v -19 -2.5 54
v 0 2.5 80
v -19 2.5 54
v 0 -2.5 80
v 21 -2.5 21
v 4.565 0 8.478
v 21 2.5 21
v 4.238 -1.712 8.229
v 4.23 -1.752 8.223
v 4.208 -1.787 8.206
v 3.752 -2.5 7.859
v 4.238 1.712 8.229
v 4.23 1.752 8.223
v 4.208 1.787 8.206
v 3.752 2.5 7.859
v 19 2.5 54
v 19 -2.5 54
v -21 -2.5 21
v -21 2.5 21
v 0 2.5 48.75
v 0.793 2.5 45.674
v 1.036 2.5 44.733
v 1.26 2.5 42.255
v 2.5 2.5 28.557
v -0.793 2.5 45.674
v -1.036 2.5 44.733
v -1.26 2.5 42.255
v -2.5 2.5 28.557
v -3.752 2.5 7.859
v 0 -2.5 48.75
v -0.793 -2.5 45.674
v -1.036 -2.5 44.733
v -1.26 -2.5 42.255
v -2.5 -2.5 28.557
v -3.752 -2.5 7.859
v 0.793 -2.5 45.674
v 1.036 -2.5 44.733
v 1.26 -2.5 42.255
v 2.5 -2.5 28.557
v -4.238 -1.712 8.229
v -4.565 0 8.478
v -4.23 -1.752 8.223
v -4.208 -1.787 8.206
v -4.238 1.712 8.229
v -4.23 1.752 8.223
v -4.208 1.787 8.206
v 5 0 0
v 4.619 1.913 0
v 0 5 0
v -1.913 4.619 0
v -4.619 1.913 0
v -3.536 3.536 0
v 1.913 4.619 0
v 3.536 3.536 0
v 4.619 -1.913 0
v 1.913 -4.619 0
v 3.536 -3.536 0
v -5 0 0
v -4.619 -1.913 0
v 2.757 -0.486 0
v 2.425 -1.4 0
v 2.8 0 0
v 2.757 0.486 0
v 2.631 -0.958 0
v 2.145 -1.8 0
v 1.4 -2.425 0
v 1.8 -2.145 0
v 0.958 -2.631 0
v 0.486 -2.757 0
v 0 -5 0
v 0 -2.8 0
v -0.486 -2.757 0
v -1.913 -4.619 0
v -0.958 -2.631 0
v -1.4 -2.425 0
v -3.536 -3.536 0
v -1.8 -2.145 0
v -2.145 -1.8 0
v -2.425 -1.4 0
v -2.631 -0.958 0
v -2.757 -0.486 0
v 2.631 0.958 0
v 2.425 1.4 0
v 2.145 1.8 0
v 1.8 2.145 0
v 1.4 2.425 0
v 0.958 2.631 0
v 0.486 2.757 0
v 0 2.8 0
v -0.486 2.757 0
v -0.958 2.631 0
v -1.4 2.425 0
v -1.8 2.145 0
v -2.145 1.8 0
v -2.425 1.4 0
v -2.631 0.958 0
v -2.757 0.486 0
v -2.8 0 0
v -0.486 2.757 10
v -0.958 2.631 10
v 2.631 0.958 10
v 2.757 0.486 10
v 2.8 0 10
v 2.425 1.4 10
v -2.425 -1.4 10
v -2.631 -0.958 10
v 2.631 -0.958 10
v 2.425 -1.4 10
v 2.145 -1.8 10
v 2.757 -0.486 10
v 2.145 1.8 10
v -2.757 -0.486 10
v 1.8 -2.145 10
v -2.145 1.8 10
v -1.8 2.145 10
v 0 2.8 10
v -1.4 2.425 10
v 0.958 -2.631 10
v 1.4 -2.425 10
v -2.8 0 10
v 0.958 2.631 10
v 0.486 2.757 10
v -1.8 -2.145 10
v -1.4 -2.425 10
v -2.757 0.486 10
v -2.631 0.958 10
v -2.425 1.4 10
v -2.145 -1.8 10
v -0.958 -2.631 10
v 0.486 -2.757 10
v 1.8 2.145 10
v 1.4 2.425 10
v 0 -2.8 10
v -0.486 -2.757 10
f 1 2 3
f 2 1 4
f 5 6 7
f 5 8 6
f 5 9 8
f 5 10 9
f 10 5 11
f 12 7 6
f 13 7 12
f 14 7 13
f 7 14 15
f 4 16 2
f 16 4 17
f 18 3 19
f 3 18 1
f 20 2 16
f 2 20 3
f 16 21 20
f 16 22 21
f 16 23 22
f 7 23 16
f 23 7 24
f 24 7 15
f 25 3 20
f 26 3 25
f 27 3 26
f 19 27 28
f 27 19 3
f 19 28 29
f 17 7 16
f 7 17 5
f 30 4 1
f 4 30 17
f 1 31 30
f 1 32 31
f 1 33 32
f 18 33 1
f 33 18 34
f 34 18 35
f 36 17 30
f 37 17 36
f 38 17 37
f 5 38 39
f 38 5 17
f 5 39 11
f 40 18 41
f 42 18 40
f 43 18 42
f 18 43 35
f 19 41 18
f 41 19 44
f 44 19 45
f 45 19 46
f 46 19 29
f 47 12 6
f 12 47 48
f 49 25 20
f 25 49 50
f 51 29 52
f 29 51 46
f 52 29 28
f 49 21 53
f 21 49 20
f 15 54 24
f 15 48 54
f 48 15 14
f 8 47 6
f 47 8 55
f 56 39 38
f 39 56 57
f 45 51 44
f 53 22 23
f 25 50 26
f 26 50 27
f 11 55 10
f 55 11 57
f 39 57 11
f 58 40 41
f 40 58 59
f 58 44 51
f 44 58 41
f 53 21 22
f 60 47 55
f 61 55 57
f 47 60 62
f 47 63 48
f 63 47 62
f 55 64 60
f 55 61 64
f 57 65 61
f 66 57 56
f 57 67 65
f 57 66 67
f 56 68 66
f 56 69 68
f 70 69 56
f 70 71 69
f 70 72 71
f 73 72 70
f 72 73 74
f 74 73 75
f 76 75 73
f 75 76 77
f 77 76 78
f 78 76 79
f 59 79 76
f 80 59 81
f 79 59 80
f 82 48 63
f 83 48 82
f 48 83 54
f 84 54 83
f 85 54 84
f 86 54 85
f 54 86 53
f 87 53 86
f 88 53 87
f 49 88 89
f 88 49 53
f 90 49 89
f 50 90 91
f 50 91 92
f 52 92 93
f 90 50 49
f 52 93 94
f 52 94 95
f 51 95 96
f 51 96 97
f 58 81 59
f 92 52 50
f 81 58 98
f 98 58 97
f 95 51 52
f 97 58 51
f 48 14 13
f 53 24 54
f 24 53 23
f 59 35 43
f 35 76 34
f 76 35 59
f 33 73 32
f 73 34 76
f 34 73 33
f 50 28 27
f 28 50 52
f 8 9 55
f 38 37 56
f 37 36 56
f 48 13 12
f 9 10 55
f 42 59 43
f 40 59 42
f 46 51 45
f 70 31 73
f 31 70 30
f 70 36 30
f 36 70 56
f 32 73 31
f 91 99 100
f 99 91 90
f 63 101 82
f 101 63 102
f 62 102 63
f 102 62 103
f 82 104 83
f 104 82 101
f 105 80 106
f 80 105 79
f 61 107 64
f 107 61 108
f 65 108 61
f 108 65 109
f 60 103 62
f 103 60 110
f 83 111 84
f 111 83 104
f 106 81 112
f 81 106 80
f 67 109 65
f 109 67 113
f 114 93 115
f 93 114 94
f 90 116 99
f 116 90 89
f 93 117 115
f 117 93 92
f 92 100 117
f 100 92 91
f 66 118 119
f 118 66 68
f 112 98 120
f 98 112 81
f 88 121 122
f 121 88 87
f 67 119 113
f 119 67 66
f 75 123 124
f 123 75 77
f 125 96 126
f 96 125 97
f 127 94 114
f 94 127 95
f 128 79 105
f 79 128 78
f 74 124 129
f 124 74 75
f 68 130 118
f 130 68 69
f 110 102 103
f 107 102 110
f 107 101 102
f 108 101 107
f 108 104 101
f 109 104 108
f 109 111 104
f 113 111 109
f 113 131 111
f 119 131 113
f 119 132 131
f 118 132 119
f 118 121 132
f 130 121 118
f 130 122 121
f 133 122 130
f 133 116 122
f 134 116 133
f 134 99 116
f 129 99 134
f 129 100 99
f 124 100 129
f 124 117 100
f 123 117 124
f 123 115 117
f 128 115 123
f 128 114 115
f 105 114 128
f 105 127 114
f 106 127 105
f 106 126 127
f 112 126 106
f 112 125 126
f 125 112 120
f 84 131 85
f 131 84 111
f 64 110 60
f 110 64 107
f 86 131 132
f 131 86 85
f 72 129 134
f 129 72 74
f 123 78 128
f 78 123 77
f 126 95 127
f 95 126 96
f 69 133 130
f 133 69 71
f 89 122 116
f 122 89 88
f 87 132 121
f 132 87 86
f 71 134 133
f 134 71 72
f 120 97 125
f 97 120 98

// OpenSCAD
union() {
	difference() {
		union() {
			translate(v = [0, 2.5000000000, 0]) {
				rotate(a = 90, v = [1, 0, 0]) {
					linear_extrude(height = 5) {
						polygon(paths = [[0, 1, 2, 3, 4, 5]], points = [[0, 5], [21, 21], [19, 54], [0, 80], [-19, 54], [-21, 21]]);
					}
				}
			}
			cylinder(h = 78, r1 = 5, r2 = 1);
		}
		cylinder($fn = 36, h = 10, r = 2.8000000000);
	}
}
